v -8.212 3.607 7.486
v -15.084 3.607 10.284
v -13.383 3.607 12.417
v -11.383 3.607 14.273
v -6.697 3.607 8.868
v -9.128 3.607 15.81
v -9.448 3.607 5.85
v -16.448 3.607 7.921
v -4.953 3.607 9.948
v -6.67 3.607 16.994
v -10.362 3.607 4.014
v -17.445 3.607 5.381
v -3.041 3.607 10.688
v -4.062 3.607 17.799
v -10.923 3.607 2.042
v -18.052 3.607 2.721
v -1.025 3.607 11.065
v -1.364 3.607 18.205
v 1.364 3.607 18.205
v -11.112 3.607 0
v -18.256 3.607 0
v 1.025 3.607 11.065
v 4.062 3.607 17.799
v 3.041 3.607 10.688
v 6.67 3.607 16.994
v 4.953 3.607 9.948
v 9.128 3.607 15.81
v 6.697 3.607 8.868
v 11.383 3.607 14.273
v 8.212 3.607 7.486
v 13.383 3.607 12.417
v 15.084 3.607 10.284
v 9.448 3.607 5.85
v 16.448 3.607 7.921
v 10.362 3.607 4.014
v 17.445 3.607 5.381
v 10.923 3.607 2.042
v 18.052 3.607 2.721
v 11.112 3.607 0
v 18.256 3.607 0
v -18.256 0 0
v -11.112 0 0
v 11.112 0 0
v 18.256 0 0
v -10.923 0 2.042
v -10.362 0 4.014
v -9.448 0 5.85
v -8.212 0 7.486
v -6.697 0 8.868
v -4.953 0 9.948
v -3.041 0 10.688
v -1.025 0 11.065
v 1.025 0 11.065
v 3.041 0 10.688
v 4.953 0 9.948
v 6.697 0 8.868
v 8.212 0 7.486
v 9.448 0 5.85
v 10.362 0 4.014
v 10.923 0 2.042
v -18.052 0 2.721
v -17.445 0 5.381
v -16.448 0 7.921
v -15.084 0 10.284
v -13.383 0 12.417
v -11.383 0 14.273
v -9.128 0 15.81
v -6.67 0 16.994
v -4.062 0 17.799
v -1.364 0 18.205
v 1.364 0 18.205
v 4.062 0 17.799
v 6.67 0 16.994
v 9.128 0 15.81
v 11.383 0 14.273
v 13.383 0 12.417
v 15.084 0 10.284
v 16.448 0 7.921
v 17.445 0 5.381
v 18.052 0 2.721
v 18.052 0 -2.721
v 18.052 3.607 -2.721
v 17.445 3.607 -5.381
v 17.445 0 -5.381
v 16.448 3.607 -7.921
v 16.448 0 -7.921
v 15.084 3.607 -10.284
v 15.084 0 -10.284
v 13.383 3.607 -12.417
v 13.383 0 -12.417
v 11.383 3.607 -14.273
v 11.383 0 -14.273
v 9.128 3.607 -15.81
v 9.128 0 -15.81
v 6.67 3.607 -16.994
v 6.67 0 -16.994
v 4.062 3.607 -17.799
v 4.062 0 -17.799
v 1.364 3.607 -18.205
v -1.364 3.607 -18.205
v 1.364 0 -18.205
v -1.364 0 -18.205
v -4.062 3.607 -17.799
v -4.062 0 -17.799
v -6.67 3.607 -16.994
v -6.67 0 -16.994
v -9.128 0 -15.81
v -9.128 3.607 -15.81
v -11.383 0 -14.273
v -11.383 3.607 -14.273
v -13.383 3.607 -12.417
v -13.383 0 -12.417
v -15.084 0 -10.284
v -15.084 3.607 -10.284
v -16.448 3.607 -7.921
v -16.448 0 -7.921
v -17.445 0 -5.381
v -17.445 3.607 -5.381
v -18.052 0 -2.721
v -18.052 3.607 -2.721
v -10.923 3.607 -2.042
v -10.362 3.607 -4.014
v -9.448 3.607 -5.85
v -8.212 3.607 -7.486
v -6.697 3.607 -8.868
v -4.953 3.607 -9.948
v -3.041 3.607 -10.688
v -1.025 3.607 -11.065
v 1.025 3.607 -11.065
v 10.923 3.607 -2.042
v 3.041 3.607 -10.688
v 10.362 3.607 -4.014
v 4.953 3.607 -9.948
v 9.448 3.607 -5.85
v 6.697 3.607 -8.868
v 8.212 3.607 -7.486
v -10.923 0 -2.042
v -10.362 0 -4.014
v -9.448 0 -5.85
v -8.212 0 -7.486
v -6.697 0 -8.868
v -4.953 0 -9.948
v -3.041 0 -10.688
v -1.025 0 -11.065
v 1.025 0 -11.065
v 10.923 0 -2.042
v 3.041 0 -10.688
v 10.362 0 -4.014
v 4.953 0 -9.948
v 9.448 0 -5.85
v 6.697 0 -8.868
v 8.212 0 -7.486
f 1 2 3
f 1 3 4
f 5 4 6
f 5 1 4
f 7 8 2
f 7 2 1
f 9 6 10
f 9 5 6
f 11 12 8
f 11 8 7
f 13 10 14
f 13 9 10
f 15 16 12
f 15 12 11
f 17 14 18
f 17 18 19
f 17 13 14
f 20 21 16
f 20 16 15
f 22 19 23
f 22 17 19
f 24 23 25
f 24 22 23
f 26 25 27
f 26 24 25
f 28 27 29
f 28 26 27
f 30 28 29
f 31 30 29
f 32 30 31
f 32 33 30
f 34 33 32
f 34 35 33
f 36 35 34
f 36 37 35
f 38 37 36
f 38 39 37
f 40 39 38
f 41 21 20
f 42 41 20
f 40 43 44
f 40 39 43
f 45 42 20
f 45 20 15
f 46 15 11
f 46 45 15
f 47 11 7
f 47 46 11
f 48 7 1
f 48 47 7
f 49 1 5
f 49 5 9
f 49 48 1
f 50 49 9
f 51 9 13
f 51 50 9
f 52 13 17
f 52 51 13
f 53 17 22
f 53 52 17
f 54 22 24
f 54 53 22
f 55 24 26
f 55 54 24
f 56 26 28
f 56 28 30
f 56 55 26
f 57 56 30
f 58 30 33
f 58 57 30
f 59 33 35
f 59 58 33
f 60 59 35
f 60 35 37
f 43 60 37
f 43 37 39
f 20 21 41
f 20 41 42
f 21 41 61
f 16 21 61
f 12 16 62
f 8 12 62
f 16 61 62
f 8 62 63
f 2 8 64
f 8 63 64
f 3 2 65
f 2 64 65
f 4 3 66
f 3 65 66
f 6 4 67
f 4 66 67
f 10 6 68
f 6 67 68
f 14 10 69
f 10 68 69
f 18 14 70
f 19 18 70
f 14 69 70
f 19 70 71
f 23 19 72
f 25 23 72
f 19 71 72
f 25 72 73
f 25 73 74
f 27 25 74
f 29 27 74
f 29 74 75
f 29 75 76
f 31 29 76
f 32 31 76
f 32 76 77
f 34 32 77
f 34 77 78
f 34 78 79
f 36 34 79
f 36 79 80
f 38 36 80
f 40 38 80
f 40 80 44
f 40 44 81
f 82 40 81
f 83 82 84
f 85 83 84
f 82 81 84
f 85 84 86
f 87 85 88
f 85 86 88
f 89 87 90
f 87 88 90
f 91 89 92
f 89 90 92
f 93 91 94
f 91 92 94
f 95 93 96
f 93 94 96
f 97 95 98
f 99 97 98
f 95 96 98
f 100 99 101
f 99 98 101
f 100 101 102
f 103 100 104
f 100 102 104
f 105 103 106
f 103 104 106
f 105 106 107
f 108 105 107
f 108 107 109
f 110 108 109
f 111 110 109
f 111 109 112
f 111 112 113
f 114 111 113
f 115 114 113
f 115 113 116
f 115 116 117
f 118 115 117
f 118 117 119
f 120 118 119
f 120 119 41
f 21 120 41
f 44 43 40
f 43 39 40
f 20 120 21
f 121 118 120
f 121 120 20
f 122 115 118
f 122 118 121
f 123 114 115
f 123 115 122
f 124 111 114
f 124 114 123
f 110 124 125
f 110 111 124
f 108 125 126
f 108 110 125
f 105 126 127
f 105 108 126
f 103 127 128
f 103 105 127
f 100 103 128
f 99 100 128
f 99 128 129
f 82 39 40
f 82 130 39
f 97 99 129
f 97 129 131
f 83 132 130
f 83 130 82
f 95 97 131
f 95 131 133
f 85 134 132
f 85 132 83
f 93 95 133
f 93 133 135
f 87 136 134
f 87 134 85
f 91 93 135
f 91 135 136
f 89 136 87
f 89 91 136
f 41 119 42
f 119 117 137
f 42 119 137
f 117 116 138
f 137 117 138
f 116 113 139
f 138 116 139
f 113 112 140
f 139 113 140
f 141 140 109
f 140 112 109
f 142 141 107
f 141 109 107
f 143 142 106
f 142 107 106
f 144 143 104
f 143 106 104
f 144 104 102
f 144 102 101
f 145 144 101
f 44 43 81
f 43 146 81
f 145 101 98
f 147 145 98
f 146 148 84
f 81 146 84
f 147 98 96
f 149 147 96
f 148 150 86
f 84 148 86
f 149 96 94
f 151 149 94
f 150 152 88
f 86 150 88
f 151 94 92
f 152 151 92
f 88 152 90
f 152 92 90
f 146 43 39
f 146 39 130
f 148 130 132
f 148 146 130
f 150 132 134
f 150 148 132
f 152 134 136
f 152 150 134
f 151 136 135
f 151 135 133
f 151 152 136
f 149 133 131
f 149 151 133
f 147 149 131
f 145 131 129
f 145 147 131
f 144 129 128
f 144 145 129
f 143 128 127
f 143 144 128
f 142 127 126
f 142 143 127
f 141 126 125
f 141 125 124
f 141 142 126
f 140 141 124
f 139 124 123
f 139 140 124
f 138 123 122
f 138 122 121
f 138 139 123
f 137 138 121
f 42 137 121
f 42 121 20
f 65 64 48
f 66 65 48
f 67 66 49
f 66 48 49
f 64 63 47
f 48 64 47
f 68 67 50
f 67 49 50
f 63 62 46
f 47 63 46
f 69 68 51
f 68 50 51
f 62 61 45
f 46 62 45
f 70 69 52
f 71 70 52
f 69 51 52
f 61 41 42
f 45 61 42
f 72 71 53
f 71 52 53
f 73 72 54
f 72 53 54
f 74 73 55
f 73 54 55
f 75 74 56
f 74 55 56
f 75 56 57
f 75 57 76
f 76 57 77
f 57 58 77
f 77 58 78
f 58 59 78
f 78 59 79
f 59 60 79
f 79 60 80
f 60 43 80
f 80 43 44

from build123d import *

# Parameters (mm, degrees)
SKETCH1_R      = 18.25625
SKETCH1_R_2    = 11.1125
EXTRUDE1_DEPTH = 3.6068


with BuildPart() as part:
    # Sketch1 → Extrude1 (new body)
    with BuildSketch(Plane(origin=(0, 0, 0), x_dir=(1, 0, 0), z_dir=(0, 1, 0))):
        Circle(SKETCH1_R)
        Circle(SKETCH1_R_2, mode=Mode.SUBTRACT)
    extrude(amount=EXTRUDE1_DEPTH)


with BuildPart() as body_2:
    # Split1: the piece on the far side of the plane
    add(part.part)
    split(bisect_by=Plane.XY, keep=Keep.BOTTOM)


with BuildPart() as part_1:
    add(part.part)

    # Split1
    split(bisect_by=Plane.XY, keep=Keep.TOP)


solid = Compound([body_2.part, part_1.part])
